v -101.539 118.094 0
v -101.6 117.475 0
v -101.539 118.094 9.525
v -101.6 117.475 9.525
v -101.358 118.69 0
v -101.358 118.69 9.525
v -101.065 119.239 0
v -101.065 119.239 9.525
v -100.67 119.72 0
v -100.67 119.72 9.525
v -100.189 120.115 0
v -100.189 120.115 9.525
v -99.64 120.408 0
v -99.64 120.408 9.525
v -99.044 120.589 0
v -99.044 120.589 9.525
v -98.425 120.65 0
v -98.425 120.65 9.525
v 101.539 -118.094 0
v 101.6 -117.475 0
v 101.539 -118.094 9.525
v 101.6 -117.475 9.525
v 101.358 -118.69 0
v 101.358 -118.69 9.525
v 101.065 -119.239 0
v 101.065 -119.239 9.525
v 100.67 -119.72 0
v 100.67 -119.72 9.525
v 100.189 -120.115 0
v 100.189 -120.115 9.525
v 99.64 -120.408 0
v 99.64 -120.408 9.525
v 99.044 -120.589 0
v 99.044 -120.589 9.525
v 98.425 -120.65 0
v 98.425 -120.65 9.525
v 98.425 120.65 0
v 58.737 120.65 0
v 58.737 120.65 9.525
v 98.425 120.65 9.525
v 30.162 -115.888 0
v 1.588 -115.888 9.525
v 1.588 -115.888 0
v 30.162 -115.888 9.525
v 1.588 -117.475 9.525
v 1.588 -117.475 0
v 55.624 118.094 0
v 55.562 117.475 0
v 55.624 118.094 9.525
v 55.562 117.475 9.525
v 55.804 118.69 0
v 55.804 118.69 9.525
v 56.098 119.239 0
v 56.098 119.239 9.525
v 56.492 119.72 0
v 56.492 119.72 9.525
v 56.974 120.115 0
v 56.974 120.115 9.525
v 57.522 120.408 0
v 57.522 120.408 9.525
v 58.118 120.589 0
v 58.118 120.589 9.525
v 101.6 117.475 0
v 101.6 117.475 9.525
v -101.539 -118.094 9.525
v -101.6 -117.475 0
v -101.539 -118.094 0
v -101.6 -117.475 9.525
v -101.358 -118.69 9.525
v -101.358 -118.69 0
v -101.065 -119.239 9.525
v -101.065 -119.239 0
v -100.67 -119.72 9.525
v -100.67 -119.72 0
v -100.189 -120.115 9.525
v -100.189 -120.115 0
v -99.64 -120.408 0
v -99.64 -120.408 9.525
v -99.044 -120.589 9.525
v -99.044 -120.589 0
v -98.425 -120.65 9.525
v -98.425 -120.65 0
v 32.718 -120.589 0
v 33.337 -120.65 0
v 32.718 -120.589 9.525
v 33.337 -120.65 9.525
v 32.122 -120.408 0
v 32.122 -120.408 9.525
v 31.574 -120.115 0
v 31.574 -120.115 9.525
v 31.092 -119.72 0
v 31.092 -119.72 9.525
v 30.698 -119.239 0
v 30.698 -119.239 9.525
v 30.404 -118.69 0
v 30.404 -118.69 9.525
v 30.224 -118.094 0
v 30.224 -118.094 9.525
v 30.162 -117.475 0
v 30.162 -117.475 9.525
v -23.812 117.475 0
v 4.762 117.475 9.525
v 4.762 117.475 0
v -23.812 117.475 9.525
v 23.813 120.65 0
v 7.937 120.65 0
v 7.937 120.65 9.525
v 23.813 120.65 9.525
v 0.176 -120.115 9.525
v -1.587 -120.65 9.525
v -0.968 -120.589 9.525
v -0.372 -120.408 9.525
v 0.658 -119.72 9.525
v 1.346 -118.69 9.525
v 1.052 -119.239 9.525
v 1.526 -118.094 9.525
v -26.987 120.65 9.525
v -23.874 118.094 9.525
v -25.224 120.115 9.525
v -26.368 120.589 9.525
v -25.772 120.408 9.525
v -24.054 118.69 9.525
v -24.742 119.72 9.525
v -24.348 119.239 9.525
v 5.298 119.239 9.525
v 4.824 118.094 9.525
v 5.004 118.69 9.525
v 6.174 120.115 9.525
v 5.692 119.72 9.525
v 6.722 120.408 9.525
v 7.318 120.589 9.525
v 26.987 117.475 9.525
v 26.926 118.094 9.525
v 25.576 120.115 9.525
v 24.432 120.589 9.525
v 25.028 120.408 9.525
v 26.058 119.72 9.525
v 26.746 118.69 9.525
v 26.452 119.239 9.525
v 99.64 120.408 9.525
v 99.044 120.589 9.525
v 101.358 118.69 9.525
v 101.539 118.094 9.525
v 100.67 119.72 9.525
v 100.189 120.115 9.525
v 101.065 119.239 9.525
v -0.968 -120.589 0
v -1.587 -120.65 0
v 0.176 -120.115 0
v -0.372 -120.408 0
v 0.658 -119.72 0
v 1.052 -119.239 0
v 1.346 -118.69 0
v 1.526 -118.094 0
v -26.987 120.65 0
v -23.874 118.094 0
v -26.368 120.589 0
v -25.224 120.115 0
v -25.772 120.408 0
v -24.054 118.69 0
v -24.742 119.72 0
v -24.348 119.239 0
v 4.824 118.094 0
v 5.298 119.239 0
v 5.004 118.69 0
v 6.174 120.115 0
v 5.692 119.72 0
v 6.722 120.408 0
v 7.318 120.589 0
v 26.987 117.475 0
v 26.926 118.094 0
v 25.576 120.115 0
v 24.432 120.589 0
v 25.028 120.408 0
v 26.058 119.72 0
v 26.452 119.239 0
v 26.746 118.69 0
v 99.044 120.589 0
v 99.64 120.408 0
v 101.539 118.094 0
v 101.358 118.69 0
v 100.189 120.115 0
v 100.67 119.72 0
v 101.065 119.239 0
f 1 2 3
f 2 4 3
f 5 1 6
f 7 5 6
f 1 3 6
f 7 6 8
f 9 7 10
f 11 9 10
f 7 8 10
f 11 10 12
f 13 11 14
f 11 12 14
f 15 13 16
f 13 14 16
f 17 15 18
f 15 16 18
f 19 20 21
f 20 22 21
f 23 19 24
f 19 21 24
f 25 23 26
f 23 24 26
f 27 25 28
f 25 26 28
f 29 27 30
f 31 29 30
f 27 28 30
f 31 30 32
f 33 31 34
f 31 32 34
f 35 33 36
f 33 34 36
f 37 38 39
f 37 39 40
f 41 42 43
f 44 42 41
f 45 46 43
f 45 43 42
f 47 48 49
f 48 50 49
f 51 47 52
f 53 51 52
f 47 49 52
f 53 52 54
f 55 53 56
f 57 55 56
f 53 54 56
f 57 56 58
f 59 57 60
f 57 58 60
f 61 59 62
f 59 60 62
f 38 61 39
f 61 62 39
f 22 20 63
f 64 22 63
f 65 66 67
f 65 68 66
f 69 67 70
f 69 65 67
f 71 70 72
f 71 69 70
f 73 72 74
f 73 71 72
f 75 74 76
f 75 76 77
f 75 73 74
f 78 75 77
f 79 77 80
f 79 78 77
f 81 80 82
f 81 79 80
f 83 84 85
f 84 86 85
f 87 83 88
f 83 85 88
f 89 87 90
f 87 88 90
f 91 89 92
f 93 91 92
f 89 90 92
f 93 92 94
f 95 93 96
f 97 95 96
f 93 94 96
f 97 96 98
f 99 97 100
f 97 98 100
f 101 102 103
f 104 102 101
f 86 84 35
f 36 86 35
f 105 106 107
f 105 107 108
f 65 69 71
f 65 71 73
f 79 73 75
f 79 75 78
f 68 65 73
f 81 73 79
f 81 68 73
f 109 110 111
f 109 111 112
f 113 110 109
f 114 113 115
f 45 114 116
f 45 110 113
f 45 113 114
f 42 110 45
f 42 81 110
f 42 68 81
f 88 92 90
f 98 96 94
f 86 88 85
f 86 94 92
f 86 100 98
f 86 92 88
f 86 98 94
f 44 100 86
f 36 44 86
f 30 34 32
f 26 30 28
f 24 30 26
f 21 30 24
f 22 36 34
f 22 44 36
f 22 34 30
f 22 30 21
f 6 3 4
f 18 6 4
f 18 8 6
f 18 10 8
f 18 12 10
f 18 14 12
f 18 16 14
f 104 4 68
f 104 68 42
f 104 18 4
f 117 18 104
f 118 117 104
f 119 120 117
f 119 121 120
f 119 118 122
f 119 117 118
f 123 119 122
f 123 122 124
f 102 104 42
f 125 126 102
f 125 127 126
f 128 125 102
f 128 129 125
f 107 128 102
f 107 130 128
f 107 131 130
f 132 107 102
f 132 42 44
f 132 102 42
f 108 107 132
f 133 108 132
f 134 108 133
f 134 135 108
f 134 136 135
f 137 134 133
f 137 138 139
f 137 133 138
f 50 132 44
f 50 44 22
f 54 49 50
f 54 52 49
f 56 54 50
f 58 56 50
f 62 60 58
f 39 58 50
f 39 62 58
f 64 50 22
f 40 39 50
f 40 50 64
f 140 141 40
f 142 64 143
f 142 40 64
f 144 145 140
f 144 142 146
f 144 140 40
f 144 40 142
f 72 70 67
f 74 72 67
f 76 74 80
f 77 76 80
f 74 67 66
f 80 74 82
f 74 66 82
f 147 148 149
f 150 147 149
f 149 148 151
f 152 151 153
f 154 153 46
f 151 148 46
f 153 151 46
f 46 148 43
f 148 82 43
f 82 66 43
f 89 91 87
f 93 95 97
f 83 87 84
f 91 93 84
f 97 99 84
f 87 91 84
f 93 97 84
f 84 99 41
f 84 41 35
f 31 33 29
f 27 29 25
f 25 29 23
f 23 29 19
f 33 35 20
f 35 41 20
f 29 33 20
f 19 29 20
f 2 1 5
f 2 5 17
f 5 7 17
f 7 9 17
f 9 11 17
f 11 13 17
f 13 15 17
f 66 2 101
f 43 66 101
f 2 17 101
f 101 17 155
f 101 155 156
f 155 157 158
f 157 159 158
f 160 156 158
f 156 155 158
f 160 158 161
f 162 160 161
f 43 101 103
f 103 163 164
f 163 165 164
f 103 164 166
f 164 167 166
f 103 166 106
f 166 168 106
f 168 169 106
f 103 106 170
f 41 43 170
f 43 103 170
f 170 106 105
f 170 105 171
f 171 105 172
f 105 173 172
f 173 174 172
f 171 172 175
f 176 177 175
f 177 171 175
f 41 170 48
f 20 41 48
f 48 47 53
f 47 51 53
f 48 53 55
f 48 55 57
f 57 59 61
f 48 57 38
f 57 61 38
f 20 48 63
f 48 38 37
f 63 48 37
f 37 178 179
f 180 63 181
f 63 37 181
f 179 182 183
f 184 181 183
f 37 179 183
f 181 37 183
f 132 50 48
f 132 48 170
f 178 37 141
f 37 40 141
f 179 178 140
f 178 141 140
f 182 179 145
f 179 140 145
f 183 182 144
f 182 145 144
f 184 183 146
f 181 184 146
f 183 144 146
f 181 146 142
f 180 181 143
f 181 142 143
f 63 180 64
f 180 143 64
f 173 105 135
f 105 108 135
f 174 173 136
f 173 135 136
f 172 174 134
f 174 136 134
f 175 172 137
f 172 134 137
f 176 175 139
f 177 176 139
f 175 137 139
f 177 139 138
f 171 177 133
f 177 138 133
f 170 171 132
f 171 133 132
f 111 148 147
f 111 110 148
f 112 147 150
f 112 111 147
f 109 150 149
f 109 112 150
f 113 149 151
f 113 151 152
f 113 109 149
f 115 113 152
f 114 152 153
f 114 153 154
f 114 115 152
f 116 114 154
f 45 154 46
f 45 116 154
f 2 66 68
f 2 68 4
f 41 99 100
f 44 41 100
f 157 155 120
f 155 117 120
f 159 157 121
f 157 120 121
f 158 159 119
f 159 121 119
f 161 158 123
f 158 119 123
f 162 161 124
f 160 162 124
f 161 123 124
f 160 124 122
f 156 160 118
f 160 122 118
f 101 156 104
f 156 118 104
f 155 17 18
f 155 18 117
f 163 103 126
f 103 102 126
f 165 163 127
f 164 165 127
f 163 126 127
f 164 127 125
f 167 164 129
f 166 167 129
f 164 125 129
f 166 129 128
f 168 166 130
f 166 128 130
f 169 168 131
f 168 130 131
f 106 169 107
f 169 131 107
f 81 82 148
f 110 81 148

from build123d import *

# Parameters (mm, degrees)
F0_W     = 203.2
F0_H     = 241.3
F1_DEPTH = 9.525
F2_W     = 28.575
F2_H     = 9.525
F3_DEPTH = 4.7625
F4_W     = 28.575
F4_H     = 9.525
F5_DEPTH = 3.175
F6_R     = 3.17499


# Not quite as in the source:
# - a fillet or chamfer is up to 0.001 mm smaller than in the source, because OpenCascade refuses the exact size


with BuildPart() as f1:
    # F0 (on Top) → F1 (new body)
    with BuildSketch(Plane.XY):
        Rectangle(F0_W, F0_H)
    extrude(amount=F1_DEPTH)

    # F2 (on face) → F3 (cut)
    with BuildSketch(Plane.XZ.offset(120.65)):
        with Locations((15.875, 4.7625)):
            Rectangle(F2_W, F2_H)
    extrude(amount=-F3_DEPTH, mode=Mode.SUBTRACT)

    # F4 (on face) → F5 (cut)
    with BuildSketch(Plane(origin=(0, 120.65, 0), x_dir=(-1, 0, 0), z_dir=(0, 1, 0))):
        with Locations((-41.275, 4.7625)):
            Rectangle(F4_W, F4_H)
        with Locations((9.525, 4.7625)):
            Rectangle(F4_W, F4_H)
    extrude(amount=-F5_DEPTH, mode=Mode.SUBTRACT)

    # F6 (radius 3.175 in the source; OpenCascade refuses exactly that, so slightly less here)
    f6_edges = [f1.edges().sort_by_distance(p)[0] for p in [
        (-101.6, 120.65, 4.7625),
        (-23.8125, 120.65, 4.7625),
        (4.7625, 120.65, 4.7625),
        (26.9875, 120.65, 4.7625),
        (55.5625, 120.65, 4.7625),
        (101.6, 120.65, 4.7625),
        (-101.6, -120.65, 4.7625),
        (1.5875, -120.65, 4.7625),
        (30.1625, -120.65, 4.7625),
        (101.6, -120.65, 4.7625),
    ]]
    fillet(f6_edges, radius=F6_R)


solid = f1.part
